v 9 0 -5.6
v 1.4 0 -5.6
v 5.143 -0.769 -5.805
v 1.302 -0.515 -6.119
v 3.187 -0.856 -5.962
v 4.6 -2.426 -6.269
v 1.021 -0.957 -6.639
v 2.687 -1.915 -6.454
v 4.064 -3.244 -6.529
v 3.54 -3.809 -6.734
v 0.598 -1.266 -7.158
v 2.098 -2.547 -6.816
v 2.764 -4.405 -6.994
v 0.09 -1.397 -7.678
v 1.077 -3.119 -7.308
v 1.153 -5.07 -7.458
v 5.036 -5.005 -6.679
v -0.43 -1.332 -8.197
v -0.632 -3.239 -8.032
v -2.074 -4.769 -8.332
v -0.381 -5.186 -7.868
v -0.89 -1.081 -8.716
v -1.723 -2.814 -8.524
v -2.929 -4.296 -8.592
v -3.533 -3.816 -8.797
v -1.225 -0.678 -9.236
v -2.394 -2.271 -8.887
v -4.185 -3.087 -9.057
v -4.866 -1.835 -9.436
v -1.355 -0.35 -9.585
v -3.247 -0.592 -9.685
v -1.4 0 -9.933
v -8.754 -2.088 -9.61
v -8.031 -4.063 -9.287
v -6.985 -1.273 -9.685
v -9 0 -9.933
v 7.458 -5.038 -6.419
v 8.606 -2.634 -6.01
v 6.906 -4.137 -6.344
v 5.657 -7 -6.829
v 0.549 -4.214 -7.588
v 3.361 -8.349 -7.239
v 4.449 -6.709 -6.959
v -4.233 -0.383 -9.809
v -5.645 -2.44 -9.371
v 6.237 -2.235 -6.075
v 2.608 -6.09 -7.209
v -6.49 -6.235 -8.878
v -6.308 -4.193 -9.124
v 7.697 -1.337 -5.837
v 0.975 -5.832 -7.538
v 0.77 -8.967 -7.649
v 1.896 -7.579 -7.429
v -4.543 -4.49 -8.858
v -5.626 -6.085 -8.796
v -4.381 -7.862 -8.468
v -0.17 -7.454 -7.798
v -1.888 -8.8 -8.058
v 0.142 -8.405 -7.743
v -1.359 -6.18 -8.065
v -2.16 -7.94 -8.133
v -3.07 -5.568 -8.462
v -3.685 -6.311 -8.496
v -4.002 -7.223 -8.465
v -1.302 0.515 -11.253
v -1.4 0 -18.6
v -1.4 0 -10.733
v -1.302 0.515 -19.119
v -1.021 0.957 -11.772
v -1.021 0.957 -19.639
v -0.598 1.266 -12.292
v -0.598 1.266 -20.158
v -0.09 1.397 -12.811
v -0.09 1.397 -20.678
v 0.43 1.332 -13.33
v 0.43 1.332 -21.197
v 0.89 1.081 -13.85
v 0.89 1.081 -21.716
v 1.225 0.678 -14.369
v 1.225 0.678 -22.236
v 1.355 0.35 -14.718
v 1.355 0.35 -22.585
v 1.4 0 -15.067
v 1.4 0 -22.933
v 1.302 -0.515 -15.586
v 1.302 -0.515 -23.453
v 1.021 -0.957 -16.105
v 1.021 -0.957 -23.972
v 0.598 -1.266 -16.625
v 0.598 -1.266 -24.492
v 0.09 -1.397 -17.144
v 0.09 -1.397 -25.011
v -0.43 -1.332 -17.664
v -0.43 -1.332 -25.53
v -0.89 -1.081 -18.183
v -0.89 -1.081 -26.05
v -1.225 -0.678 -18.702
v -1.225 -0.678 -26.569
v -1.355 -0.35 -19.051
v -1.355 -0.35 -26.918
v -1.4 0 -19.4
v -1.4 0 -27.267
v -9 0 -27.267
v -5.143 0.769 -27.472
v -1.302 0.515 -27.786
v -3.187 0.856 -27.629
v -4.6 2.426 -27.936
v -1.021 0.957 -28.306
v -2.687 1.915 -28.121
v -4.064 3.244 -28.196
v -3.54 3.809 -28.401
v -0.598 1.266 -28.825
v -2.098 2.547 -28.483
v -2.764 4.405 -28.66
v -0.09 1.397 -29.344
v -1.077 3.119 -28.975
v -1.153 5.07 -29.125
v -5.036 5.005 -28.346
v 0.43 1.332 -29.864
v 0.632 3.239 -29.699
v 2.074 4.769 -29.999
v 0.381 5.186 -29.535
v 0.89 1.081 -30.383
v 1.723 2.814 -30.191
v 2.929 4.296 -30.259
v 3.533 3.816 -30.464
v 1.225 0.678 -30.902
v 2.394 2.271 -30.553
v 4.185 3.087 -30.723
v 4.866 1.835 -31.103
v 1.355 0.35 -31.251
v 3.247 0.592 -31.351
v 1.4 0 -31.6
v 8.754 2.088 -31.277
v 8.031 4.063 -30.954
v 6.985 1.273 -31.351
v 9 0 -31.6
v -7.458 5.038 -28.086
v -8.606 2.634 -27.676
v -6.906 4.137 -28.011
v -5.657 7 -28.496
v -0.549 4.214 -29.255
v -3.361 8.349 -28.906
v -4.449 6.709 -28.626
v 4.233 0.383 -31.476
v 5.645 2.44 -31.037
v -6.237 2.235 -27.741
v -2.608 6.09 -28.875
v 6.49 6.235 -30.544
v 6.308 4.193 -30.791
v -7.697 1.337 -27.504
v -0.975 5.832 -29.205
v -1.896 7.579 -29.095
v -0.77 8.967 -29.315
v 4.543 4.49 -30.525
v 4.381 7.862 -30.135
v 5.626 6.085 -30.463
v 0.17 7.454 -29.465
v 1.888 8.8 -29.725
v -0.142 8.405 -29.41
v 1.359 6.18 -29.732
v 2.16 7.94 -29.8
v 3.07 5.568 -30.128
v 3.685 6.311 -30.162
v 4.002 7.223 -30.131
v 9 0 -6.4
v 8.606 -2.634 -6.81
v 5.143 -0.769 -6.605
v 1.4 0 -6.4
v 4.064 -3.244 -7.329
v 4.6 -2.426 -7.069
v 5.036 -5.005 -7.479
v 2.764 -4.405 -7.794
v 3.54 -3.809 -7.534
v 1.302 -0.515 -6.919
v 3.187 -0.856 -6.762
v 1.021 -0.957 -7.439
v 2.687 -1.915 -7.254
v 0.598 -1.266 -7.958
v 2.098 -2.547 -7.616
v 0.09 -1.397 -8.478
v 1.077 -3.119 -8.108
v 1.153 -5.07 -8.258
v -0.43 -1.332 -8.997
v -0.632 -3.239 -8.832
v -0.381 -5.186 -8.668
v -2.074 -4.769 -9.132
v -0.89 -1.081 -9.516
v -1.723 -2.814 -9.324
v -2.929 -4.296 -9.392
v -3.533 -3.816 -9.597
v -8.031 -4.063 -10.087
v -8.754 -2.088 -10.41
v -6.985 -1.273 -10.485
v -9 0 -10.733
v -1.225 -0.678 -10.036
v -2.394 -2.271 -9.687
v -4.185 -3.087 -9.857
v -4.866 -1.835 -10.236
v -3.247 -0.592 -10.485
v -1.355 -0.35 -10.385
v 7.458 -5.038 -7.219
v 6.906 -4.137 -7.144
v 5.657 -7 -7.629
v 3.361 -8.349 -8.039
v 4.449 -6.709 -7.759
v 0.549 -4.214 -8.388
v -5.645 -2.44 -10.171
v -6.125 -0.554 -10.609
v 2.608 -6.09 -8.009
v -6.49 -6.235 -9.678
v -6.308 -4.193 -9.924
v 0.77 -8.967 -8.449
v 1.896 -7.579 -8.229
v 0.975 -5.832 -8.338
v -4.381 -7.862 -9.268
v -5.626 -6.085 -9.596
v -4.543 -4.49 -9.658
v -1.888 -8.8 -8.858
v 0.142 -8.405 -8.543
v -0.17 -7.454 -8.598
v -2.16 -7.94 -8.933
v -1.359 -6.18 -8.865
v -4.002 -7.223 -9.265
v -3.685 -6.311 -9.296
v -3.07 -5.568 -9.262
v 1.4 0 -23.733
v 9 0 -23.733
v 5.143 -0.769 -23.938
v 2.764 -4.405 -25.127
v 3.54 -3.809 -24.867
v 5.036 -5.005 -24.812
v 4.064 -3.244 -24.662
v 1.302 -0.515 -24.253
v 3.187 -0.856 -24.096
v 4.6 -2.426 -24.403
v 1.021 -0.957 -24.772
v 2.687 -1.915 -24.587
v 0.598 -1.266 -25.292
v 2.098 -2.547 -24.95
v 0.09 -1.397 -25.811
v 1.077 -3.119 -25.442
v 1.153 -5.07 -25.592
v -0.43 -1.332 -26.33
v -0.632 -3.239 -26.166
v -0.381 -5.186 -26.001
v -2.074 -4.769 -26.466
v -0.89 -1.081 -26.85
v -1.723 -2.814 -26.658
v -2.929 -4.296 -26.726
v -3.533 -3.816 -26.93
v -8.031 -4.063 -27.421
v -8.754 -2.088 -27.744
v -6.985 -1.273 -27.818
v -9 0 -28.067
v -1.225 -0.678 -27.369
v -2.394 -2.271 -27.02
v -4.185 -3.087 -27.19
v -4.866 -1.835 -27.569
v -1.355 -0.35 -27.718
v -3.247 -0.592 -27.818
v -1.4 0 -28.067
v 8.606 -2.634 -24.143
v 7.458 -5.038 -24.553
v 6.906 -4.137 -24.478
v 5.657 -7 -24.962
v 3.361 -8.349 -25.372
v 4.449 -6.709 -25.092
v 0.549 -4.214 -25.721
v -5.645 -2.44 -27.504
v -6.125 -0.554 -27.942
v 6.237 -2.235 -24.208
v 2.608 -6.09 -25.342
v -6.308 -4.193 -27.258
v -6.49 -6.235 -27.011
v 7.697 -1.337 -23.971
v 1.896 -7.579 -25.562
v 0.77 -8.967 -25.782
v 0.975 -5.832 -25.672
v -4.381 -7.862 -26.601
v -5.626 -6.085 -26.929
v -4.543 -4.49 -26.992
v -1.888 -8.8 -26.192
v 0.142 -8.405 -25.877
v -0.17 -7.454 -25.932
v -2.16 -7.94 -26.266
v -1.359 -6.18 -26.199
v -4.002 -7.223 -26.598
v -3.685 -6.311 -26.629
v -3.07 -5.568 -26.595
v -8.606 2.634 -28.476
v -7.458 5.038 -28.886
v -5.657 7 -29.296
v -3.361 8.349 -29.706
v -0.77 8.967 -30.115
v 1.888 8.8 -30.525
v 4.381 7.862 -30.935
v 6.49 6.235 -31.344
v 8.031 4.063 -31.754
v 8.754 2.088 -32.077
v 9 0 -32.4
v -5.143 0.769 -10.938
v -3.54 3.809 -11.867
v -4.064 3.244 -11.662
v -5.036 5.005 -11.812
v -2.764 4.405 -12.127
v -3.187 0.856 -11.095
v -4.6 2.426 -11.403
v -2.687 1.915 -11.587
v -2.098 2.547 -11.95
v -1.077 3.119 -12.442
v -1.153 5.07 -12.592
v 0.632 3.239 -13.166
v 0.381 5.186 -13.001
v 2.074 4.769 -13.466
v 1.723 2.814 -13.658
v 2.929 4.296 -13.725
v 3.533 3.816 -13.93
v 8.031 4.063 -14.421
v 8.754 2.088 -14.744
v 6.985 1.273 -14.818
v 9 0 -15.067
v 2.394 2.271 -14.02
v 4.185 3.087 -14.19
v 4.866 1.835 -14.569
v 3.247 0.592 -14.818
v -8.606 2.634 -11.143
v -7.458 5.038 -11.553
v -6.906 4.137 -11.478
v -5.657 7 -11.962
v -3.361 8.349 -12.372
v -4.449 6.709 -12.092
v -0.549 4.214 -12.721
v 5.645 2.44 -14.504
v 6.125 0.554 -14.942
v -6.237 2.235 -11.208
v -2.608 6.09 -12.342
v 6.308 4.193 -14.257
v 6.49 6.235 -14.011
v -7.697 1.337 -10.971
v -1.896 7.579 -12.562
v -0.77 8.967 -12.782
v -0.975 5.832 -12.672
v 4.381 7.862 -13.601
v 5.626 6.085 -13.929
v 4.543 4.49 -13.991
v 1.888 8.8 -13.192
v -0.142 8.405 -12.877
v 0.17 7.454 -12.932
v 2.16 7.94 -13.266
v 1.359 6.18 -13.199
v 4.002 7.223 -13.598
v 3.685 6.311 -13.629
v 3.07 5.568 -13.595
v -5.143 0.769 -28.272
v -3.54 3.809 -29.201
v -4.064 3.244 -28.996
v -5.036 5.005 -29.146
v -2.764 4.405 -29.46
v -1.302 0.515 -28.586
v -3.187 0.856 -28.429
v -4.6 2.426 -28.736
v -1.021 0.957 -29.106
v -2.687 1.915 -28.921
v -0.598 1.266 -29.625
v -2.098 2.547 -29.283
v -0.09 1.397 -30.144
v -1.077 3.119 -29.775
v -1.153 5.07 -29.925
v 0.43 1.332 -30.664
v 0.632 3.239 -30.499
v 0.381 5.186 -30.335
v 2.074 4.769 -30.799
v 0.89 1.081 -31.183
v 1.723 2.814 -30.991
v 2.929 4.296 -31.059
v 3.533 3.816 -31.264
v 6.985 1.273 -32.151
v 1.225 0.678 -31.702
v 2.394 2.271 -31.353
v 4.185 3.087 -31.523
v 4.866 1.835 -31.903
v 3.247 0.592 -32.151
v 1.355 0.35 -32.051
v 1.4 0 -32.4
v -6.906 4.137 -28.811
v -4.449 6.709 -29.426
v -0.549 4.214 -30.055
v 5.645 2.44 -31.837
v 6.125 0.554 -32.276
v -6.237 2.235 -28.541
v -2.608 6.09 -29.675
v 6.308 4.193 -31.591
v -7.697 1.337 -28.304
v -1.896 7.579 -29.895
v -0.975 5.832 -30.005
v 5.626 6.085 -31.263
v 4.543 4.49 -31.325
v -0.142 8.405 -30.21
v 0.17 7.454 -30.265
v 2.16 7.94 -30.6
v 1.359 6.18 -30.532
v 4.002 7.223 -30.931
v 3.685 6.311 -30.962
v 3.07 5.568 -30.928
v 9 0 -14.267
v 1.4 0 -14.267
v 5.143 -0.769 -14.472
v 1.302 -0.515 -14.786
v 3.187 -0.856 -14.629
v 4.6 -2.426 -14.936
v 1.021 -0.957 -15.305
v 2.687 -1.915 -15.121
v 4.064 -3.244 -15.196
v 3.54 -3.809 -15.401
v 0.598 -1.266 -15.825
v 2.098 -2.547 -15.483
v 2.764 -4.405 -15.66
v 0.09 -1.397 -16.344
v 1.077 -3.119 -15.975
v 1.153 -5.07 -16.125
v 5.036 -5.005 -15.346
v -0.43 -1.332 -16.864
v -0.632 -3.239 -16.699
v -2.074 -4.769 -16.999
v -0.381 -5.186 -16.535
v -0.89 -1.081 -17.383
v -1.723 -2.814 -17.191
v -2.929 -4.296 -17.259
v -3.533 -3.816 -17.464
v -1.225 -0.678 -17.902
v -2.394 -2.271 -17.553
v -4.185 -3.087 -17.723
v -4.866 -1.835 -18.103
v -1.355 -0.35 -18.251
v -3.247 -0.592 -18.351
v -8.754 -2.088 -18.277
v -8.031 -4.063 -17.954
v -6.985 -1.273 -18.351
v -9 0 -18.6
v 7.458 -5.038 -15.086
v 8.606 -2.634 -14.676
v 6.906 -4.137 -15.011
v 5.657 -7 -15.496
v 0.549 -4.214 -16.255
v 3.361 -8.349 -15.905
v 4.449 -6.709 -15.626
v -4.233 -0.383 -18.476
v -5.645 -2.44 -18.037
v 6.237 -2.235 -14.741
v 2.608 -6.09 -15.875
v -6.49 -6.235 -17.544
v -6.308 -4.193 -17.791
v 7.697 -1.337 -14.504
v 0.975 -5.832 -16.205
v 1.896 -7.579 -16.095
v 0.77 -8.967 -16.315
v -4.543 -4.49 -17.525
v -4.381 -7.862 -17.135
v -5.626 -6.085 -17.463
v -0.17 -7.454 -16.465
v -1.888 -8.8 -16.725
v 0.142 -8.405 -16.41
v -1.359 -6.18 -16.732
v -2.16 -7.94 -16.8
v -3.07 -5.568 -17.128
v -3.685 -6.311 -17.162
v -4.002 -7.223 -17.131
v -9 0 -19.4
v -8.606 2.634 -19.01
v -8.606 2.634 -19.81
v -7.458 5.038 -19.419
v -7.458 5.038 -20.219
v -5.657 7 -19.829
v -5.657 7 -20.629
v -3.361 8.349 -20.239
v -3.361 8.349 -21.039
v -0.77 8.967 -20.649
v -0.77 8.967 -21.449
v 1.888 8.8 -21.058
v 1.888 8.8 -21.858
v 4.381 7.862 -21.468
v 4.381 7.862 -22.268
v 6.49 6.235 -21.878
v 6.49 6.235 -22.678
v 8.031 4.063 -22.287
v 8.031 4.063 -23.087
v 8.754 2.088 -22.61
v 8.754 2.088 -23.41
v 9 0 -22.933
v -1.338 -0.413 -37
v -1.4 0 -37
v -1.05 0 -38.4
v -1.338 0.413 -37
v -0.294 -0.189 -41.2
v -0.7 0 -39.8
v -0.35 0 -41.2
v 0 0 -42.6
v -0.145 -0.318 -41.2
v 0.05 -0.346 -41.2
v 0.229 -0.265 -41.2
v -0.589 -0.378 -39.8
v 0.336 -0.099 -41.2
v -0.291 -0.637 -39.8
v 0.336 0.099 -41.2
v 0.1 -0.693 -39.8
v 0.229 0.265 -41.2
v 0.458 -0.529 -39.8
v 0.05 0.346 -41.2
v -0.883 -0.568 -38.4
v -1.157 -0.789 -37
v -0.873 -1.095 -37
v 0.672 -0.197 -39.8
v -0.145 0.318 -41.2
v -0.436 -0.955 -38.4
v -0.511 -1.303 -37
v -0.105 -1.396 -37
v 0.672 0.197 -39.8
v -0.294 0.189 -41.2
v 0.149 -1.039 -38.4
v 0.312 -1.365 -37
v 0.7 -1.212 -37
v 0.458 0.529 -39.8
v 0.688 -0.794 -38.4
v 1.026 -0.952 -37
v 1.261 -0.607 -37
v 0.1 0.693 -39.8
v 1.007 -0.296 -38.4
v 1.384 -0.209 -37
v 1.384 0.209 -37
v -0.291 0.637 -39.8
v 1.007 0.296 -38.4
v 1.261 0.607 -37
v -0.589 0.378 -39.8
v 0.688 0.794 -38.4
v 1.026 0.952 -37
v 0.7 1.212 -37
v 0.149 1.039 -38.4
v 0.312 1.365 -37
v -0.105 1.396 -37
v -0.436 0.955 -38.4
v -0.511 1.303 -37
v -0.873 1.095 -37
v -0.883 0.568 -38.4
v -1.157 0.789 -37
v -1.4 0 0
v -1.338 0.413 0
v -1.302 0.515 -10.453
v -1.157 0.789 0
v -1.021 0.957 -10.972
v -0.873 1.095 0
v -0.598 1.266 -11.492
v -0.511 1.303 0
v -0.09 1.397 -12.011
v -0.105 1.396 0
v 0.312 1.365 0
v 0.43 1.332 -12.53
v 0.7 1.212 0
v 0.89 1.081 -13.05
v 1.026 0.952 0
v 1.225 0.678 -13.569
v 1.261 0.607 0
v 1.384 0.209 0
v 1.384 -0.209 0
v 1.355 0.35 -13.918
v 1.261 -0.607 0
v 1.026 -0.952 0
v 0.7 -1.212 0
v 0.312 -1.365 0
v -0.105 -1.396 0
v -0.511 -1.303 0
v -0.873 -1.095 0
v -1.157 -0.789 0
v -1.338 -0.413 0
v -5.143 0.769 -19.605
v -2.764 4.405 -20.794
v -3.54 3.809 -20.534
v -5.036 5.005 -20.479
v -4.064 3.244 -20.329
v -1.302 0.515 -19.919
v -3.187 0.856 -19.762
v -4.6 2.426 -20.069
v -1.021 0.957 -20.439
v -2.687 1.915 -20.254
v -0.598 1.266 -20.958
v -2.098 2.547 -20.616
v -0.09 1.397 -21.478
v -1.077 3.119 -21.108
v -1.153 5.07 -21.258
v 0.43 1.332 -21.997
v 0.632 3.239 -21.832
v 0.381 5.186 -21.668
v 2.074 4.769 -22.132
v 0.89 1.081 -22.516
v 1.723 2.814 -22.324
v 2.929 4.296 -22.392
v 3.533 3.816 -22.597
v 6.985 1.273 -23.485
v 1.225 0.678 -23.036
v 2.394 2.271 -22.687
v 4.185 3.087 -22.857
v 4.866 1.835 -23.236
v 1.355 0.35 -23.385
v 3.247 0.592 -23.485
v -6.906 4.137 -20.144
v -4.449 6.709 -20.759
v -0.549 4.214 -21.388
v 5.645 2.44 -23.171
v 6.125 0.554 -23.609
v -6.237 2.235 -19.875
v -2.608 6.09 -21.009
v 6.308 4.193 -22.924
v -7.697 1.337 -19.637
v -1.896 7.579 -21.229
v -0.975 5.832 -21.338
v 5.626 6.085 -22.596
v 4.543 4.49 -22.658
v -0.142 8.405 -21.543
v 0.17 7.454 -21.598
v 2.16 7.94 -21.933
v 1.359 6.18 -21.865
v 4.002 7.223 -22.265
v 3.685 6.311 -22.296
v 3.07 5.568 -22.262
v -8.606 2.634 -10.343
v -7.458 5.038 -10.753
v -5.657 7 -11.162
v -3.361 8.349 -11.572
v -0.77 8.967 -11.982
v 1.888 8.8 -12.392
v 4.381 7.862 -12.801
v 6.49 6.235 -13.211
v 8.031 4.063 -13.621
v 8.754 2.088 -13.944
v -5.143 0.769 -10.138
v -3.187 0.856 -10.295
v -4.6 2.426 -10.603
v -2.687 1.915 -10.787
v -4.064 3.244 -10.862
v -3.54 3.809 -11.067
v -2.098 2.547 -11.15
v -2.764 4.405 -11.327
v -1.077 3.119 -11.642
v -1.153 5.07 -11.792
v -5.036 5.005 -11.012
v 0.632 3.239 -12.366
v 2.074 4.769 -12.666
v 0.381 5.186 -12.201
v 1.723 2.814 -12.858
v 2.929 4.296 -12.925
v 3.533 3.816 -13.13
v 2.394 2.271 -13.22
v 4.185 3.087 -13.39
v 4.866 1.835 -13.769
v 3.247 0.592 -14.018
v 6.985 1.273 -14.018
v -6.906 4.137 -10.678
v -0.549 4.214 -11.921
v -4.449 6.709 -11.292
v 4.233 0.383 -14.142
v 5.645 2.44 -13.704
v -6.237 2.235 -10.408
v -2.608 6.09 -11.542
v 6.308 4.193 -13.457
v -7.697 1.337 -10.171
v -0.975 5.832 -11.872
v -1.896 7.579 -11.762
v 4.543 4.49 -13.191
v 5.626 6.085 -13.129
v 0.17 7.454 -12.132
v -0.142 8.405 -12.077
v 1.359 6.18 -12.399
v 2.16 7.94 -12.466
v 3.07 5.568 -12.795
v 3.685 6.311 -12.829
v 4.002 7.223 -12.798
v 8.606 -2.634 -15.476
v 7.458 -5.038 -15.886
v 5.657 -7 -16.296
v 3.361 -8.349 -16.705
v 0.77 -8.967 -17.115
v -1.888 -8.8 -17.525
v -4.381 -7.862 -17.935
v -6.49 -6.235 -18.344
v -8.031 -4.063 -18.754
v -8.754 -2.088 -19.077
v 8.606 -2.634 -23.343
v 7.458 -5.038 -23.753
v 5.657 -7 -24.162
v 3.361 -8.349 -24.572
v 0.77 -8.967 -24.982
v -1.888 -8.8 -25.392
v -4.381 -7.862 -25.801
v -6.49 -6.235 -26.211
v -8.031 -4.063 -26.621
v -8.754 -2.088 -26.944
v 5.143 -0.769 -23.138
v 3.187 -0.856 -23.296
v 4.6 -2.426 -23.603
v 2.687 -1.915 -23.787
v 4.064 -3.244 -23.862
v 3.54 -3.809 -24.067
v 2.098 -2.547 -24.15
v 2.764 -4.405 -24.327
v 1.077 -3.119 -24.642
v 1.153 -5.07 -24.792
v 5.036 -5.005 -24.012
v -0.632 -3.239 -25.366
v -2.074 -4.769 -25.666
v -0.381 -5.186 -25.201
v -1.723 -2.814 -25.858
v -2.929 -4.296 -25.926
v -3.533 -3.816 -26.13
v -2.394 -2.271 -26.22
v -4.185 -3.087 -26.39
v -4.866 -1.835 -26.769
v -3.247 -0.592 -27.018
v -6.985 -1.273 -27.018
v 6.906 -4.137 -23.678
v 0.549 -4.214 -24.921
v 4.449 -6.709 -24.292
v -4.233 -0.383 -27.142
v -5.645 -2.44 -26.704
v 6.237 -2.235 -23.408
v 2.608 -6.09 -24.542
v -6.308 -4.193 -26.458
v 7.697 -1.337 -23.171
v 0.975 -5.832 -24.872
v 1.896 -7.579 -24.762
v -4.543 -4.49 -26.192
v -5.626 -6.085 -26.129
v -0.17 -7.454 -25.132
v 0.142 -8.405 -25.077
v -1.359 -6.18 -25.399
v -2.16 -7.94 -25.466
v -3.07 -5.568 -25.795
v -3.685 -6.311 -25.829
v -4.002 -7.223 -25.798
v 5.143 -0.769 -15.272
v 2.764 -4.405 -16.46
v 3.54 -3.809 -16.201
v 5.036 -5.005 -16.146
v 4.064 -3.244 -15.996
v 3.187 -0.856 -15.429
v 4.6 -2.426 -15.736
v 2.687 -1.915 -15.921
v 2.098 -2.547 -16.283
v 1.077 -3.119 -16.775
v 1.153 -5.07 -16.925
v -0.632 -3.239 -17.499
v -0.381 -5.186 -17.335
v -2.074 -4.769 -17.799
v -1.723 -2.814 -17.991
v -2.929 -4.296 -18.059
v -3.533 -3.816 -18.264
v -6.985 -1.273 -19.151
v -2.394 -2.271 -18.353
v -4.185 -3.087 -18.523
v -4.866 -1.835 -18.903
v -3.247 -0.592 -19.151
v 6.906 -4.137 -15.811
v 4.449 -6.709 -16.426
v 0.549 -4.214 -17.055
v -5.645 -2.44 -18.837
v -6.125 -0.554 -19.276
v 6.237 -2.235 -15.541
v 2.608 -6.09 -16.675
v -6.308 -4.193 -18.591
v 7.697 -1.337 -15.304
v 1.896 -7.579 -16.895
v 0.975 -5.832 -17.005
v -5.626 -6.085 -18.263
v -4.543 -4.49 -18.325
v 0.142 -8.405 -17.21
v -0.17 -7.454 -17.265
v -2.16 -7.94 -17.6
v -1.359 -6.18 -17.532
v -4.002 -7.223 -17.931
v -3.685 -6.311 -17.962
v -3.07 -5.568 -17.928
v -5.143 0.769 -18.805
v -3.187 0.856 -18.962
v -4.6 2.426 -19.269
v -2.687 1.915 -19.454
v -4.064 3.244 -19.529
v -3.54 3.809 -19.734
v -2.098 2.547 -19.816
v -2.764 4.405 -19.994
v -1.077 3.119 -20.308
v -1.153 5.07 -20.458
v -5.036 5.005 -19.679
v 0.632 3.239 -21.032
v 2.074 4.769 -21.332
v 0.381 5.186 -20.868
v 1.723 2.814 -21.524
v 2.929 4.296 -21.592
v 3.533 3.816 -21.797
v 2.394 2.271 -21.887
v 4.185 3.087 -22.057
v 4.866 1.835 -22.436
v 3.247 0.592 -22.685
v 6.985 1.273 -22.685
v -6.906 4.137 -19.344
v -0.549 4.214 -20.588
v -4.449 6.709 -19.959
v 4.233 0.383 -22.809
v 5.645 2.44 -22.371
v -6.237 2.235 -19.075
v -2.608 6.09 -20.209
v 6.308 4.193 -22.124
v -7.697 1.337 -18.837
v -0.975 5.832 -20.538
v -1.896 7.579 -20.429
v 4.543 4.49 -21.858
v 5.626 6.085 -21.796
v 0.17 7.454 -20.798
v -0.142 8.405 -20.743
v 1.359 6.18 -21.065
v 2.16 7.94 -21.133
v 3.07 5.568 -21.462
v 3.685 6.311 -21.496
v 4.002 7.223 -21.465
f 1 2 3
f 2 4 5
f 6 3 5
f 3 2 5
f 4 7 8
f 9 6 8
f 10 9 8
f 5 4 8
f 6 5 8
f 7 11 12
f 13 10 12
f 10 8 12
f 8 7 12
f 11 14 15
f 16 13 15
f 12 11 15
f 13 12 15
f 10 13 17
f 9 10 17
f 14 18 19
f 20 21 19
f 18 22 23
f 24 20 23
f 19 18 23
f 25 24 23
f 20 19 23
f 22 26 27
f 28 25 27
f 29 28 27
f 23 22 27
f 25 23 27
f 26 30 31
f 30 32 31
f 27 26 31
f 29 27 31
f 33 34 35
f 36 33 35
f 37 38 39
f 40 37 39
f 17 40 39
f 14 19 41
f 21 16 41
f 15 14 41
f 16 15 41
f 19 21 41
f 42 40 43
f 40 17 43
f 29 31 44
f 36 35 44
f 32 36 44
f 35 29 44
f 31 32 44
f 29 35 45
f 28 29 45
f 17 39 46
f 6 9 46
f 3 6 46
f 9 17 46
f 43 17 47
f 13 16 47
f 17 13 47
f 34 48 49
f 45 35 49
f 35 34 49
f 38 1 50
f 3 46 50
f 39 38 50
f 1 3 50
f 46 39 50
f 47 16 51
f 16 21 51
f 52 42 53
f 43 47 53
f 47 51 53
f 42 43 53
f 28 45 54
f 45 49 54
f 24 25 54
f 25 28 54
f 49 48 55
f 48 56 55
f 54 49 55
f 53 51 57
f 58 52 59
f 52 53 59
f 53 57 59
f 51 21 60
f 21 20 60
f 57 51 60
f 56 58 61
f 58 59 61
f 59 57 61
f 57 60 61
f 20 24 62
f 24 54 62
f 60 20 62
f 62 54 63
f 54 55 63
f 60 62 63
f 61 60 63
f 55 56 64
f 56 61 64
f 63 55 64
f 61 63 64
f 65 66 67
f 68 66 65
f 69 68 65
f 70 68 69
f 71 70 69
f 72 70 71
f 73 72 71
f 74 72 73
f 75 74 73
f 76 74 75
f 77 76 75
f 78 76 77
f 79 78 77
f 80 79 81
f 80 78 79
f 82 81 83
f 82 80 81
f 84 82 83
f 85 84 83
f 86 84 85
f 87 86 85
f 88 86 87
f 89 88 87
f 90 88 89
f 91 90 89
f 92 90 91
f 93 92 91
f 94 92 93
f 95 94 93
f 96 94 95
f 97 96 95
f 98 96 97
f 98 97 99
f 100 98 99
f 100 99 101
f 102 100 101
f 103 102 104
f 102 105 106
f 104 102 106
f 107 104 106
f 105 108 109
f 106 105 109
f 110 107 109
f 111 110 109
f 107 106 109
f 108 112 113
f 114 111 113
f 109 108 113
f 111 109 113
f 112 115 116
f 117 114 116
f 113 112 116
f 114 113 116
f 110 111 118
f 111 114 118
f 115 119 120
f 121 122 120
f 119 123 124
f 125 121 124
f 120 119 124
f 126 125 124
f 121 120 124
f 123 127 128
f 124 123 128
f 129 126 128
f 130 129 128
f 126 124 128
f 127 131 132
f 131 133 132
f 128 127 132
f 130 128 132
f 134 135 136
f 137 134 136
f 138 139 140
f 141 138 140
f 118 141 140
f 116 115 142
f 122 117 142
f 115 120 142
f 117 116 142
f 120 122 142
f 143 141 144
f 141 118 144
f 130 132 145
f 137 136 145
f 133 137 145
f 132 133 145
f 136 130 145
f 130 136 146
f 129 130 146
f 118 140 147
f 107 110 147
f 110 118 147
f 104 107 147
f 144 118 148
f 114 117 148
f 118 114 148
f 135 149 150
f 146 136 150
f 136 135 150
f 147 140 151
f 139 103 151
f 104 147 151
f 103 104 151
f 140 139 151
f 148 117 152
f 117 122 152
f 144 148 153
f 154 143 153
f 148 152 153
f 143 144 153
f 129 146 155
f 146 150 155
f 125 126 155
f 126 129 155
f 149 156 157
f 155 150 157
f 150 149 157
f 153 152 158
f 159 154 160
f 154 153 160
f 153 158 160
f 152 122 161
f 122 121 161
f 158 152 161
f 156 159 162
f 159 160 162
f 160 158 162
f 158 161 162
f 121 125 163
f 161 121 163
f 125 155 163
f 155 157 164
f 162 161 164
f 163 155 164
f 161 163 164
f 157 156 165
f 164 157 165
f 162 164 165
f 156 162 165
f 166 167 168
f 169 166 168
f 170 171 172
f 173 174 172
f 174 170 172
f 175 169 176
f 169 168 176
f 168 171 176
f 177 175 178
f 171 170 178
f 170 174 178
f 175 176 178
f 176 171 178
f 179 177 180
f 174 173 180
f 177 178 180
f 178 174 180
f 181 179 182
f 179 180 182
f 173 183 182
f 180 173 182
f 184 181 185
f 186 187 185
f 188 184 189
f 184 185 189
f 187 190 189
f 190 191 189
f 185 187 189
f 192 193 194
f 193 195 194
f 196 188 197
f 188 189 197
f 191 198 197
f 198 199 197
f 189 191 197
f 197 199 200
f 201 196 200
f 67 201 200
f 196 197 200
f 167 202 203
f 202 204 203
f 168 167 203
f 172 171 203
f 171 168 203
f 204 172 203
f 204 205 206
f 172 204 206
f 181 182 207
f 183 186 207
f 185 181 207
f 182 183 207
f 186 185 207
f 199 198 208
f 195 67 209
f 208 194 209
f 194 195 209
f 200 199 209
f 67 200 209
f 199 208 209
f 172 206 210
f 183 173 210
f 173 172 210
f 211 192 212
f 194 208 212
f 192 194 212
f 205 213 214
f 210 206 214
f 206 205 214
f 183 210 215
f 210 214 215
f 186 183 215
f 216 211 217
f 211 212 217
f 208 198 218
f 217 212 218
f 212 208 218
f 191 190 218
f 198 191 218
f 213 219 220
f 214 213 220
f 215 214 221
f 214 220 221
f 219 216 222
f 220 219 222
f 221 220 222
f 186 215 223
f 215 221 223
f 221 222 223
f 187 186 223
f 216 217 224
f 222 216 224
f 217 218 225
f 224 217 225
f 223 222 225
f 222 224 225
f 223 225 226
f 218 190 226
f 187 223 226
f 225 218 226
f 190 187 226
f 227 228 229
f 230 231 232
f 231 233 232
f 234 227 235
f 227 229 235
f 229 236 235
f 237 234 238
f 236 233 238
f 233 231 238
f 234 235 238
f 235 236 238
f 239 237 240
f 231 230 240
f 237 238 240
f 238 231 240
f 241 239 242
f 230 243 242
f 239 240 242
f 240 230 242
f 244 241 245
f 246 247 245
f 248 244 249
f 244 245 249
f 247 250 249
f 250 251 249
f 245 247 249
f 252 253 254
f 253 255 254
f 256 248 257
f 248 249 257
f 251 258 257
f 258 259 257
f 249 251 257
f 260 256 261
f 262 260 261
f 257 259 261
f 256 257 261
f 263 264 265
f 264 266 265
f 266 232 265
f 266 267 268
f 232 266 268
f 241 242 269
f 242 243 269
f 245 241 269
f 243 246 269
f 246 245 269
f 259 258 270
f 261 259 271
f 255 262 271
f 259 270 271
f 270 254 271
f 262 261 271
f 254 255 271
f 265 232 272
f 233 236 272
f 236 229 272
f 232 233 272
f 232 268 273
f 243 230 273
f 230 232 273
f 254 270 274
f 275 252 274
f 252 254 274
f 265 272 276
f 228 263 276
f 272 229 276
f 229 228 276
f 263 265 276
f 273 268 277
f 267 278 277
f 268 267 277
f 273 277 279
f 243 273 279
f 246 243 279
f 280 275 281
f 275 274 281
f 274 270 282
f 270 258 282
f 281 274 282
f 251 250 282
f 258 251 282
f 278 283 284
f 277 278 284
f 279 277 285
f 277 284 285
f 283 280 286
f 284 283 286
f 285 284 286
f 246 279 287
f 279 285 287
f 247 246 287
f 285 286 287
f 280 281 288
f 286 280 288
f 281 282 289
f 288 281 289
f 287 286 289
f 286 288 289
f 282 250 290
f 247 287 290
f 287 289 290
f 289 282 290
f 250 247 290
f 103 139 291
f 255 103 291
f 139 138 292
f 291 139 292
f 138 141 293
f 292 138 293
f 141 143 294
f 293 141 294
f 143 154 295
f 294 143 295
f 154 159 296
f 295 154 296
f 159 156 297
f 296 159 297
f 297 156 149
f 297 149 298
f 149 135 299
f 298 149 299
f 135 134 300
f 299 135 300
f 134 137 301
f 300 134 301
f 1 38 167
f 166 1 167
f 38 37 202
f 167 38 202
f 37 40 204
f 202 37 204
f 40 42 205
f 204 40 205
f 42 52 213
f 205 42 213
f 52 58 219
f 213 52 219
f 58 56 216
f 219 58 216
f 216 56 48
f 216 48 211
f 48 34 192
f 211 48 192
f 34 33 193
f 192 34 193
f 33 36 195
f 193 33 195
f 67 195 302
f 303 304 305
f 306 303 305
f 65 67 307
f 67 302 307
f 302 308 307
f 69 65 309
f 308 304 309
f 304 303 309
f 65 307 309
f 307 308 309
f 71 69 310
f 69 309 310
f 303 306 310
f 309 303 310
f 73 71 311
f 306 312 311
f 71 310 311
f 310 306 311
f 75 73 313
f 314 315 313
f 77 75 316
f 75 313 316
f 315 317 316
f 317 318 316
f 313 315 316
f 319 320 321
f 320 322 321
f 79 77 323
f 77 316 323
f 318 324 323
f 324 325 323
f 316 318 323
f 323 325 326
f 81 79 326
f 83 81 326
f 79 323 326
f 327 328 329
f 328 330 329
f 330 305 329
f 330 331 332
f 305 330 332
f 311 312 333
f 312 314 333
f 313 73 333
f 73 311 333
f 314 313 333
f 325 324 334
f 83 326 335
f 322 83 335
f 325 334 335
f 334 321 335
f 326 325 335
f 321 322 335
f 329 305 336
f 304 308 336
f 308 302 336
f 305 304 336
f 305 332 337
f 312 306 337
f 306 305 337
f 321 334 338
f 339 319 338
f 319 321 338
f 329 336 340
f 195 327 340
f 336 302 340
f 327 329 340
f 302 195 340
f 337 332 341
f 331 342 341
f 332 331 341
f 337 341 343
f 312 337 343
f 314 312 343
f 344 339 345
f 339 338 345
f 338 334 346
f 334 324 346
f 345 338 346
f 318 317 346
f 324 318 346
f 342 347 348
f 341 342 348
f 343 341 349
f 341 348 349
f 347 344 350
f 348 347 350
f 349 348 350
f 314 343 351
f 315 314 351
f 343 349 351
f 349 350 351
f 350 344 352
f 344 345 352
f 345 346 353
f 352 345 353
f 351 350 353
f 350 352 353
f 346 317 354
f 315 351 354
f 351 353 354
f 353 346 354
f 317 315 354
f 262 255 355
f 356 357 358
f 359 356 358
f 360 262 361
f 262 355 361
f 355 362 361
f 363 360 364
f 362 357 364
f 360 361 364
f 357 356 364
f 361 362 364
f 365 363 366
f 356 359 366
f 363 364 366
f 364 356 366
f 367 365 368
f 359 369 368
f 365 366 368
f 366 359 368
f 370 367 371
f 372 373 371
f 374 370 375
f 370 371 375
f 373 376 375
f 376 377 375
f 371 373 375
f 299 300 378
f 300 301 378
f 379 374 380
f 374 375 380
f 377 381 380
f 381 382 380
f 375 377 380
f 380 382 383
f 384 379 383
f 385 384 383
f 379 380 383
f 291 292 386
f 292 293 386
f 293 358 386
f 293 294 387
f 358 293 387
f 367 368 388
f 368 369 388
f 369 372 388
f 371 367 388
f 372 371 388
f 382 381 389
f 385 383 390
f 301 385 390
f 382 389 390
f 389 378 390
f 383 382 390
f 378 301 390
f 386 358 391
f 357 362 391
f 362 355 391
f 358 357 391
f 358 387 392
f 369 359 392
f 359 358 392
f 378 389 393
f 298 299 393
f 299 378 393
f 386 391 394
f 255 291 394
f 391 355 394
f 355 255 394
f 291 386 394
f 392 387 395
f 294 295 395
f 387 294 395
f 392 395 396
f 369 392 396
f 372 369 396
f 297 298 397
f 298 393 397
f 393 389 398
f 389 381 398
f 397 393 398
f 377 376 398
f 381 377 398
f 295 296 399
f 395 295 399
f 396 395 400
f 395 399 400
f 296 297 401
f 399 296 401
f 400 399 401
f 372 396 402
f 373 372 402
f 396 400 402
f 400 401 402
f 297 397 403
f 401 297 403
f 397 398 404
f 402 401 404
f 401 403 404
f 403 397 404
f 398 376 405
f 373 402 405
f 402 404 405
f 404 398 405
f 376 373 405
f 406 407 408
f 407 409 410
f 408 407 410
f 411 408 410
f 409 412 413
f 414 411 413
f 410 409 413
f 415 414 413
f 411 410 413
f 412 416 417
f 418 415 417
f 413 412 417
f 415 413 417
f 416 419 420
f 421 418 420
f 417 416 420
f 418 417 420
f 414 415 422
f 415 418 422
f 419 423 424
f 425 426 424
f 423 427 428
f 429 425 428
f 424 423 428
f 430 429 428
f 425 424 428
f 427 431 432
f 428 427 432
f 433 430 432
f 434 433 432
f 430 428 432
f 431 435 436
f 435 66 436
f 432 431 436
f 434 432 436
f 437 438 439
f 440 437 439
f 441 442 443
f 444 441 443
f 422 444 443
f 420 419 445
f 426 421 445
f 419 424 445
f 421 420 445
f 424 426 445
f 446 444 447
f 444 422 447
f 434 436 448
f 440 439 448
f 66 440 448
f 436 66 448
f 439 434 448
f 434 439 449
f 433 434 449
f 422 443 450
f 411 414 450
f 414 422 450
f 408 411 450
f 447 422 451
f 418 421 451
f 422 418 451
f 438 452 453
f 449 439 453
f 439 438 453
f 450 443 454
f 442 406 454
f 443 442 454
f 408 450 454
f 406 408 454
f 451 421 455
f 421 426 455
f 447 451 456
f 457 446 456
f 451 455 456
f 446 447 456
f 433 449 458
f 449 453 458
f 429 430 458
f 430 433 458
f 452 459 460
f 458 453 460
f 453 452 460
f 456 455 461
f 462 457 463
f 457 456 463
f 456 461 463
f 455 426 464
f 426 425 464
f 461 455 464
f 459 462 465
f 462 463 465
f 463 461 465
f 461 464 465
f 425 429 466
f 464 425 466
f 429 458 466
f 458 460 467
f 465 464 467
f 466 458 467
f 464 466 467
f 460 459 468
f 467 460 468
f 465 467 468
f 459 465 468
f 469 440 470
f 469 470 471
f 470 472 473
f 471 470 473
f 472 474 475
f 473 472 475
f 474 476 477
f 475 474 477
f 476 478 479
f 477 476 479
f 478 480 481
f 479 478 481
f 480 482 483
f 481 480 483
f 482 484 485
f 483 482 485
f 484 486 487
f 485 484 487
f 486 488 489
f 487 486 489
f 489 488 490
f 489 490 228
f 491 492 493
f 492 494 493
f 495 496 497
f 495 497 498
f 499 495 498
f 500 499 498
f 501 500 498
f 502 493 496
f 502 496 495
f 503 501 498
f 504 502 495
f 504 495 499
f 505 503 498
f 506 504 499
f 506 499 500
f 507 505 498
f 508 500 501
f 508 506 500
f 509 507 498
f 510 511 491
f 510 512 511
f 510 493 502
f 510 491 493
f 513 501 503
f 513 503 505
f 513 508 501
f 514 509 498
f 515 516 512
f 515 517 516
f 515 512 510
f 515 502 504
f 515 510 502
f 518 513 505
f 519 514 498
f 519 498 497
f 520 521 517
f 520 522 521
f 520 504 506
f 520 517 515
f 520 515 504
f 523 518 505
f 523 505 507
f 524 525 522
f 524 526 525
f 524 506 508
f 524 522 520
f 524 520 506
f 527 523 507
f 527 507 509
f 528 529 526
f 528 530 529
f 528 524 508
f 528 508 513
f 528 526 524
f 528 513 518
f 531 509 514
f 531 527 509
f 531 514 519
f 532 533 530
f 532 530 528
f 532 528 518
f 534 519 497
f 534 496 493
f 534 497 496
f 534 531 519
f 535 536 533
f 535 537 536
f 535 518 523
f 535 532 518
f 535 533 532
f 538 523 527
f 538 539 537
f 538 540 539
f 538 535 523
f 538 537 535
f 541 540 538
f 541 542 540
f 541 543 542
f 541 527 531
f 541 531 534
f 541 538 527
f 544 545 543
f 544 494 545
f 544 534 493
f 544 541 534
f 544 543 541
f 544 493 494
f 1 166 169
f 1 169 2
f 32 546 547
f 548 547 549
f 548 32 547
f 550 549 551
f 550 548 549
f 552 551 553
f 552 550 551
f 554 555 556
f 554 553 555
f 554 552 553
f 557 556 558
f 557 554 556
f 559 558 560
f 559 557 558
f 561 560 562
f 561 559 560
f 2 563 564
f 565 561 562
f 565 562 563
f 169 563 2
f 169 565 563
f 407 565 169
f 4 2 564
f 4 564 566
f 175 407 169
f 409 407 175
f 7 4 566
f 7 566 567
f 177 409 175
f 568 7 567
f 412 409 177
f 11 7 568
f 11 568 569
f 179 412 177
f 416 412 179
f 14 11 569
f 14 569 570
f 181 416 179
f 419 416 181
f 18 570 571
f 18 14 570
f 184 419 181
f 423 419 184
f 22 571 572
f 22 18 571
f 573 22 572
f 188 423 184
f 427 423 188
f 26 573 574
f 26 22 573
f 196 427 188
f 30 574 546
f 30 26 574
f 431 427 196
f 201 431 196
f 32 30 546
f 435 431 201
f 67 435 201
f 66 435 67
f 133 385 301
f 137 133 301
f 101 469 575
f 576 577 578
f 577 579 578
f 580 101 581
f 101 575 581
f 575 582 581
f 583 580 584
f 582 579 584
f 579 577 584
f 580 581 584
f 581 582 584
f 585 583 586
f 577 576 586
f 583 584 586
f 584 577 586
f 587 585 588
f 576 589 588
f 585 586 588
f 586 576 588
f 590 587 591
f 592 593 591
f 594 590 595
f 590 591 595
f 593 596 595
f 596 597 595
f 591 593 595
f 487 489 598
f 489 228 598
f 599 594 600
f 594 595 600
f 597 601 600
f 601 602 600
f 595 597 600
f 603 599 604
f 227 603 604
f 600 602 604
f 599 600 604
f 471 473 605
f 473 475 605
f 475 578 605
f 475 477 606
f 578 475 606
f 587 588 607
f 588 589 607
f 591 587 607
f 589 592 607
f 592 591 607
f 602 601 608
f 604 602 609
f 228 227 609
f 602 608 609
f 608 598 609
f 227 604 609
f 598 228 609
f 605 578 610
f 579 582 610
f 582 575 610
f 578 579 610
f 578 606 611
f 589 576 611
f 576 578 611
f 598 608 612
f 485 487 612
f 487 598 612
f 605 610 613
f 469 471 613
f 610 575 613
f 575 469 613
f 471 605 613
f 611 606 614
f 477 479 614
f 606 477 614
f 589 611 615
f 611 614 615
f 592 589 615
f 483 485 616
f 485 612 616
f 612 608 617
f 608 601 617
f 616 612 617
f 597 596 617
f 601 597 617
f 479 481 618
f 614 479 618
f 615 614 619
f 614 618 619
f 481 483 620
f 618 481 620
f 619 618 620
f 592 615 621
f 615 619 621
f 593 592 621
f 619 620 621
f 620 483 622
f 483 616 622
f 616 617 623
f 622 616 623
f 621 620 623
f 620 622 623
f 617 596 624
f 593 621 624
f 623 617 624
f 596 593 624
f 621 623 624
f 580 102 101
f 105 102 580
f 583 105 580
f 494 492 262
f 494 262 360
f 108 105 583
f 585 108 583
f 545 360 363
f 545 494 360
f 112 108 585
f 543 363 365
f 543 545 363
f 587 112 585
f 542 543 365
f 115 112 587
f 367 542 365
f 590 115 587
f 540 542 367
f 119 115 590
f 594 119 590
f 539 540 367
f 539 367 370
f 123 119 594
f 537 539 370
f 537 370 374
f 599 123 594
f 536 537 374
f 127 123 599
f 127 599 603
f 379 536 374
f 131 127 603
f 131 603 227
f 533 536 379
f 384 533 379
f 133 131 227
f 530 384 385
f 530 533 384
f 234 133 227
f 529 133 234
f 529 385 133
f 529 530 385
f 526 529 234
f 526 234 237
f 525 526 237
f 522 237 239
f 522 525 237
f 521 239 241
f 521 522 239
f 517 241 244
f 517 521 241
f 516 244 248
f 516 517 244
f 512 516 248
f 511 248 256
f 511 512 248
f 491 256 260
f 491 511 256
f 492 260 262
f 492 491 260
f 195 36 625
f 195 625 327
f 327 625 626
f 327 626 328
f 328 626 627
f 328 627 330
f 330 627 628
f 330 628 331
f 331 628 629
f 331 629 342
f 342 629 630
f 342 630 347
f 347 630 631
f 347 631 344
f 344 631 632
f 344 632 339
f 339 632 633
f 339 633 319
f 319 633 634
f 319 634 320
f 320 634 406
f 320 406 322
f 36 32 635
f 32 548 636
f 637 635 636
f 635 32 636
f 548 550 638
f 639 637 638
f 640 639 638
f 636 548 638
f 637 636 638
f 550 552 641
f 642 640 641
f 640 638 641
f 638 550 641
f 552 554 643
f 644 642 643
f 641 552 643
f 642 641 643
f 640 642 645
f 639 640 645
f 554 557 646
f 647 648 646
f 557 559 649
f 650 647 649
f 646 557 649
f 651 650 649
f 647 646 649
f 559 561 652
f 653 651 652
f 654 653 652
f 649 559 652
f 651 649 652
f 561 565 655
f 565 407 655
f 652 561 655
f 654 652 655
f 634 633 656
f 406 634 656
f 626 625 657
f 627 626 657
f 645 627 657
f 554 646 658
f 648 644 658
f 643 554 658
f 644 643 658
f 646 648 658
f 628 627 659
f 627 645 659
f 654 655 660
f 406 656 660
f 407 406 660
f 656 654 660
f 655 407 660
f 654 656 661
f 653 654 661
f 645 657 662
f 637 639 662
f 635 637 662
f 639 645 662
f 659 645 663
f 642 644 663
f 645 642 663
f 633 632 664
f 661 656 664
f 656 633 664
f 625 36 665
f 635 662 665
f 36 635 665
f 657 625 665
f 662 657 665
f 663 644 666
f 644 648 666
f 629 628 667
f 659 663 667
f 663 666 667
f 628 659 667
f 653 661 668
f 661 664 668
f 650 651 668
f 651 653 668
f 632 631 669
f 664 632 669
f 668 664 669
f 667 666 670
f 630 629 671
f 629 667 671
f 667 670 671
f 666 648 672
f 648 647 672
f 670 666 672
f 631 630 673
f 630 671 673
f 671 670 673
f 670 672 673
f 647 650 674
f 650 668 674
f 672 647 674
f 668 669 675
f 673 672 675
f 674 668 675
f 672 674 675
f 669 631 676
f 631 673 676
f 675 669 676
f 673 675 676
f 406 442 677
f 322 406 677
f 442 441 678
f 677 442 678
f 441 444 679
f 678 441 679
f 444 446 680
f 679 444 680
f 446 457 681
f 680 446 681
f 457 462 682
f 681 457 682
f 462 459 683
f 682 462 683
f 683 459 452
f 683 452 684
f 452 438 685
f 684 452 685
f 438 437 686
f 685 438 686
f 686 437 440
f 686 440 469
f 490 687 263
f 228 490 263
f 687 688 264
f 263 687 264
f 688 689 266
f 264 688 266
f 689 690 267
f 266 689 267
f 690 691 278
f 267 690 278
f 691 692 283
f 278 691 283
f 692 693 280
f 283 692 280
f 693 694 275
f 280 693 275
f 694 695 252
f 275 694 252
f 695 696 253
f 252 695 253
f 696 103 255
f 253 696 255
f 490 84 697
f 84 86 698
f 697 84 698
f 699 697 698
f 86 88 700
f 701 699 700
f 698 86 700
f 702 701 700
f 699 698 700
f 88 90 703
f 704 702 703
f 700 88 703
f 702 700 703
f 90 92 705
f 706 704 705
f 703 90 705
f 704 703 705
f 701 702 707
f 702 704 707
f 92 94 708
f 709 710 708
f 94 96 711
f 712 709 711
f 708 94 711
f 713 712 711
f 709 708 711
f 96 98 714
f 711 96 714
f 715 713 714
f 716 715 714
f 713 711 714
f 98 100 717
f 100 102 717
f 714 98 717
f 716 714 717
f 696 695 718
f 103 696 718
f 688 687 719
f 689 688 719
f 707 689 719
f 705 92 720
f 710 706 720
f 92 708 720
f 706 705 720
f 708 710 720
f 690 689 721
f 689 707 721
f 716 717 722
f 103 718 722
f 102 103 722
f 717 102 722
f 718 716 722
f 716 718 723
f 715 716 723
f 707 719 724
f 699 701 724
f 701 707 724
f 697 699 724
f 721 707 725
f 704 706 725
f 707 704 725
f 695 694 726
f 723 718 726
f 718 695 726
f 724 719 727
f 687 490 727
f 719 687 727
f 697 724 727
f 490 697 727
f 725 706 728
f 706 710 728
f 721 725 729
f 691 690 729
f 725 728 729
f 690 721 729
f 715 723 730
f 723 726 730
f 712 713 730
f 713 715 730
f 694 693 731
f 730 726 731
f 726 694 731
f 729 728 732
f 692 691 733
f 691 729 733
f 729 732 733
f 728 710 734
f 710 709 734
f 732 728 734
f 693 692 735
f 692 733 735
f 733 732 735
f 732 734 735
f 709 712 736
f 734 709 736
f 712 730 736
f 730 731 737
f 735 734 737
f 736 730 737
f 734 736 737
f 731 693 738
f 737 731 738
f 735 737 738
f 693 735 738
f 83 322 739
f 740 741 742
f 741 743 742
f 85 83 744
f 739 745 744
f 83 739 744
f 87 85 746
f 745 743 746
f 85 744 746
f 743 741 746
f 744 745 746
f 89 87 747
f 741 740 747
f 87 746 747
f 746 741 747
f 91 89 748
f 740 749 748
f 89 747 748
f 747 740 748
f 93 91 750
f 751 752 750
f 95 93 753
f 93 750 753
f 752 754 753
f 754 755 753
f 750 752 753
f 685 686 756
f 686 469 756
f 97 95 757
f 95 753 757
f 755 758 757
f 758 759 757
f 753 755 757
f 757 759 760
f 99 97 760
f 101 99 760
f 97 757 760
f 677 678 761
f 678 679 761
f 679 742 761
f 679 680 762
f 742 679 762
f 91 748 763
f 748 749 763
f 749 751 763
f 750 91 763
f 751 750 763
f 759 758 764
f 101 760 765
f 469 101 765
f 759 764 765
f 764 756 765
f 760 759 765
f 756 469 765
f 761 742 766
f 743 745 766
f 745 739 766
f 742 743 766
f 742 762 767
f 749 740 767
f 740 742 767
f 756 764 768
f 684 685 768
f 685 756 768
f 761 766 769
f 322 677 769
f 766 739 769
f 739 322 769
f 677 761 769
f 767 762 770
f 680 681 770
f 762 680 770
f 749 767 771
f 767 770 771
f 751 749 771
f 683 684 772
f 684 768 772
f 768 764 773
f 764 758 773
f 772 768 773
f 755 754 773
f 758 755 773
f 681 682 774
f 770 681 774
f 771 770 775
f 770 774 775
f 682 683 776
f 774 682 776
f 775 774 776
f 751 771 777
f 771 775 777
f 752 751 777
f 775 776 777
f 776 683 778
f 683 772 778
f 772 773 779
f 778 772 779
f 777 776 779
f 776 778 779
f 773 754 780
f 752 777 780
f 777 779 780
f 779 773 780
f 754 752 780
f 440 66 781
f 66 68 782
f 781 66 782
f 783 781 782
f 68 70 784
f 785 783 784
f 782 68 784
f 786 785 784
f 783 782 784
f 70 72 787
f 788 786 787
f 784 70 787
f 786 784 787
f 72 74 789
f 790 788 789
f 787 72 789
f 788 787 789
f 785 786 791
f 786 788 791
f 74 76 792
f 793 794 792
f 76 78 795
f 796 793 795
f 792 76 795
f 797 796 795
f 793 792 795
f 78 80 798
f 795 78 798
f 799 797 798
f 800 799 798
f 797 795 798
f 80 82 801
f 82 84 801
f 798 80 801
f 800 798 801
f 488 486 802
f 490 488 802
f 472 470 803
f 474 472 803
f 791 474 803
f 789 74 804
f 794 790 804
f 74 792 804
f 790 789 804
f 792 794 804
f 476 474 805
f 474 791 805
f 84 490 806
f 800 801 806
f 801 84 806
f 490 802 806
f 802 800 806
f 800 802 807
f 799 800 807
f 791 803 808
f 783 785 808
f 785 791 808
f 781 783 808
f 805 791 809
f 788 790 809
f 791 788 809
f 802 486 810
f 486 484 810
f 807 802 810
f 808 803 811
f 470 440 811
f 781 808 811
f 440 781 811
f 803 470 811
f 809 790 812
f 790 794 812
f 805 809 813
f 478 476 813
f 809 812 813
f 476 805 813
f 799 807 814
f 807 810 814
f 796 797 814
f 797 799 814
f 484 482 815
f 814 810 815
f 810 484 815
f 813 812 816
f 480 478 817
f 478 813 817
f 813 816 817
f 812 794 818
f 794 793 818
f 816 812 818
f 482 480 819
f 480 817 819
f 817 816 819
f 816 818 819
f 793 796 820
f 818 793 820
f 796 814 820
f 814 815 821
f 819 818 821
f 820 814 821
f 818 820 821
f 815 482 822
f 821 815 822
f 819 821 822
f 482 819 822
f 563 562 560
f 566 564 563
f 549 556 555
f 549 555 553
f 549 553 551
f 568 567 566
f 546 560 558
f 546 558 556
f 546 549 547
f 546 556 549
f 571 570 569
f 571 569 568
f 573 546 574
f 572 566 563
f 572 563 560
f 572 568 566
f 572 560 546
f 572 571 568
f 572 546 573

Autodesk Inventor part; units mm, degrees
ref_plane "YZ Plane" through (0, 0, 0) normal (1, 0, 0) x (0, 1, 0)
ref_plane "XZ Plane" through (0, 0, 0) normal (0, 1, 0) x (-1, 0, 0)
ref_plane "XY Plane" through (0, 0, 0) normal (0, 0, 1) x (1, 0, 0)
sketch "Boceto1" plane through (0, 0, 0) normal (0, 1, 0) x (-1, 0, 0)
  line L0 (0, 0) -> (1.4, 0)
  line L1 (1.4, 0) -> (1.4, -37)
  line L2 (1.4, -37) -> (0, -42.6)
  line L3 (0, -42.6) -> (0, 0)
  dimension "d0" = 1.4
  dimension "d1" = 5.6
  dimension "d2" = 42.6
revolve "Revolución1" add sketch "Boceto1" angle 360 about axis through (0, 0, -42.6) along (0, 0, 1)
sketch "Boceto2" plane through (0, 0, 0) normal (0, 1, 0) x (-1, 0, 0)
  line L0 (-1.4, 0) -> (-1.4, -37) projected
  line L1 (-1.4, -5.6) -> (-9, -5.6)
  line L2 (-9, -5.6) -> (-9, -6.4)
  line L3 (-9, -6.4) -> (-1.4, -6.4)
  line L4 (-1.4, -5.6) -> (-1.4, -6.4)
  line L5 (-1.4, 0) -> (1.4, 0) projected
  line L6 (0, 0) -> (0, -42.6)
  line L7 (1.4, -37) -> (0, -42.6) projected
  dimension "d4" = 0.8
  dimension "d5" = 7.6
  dimension "d6" = 5.6
coil "Bobina1" sketch "Boceto2" operation add axis through (0, 0, 0) along (0, 0, -1) pitch 8.6667 turns 3 hand right
properties part number "Pieza de practica 8"
